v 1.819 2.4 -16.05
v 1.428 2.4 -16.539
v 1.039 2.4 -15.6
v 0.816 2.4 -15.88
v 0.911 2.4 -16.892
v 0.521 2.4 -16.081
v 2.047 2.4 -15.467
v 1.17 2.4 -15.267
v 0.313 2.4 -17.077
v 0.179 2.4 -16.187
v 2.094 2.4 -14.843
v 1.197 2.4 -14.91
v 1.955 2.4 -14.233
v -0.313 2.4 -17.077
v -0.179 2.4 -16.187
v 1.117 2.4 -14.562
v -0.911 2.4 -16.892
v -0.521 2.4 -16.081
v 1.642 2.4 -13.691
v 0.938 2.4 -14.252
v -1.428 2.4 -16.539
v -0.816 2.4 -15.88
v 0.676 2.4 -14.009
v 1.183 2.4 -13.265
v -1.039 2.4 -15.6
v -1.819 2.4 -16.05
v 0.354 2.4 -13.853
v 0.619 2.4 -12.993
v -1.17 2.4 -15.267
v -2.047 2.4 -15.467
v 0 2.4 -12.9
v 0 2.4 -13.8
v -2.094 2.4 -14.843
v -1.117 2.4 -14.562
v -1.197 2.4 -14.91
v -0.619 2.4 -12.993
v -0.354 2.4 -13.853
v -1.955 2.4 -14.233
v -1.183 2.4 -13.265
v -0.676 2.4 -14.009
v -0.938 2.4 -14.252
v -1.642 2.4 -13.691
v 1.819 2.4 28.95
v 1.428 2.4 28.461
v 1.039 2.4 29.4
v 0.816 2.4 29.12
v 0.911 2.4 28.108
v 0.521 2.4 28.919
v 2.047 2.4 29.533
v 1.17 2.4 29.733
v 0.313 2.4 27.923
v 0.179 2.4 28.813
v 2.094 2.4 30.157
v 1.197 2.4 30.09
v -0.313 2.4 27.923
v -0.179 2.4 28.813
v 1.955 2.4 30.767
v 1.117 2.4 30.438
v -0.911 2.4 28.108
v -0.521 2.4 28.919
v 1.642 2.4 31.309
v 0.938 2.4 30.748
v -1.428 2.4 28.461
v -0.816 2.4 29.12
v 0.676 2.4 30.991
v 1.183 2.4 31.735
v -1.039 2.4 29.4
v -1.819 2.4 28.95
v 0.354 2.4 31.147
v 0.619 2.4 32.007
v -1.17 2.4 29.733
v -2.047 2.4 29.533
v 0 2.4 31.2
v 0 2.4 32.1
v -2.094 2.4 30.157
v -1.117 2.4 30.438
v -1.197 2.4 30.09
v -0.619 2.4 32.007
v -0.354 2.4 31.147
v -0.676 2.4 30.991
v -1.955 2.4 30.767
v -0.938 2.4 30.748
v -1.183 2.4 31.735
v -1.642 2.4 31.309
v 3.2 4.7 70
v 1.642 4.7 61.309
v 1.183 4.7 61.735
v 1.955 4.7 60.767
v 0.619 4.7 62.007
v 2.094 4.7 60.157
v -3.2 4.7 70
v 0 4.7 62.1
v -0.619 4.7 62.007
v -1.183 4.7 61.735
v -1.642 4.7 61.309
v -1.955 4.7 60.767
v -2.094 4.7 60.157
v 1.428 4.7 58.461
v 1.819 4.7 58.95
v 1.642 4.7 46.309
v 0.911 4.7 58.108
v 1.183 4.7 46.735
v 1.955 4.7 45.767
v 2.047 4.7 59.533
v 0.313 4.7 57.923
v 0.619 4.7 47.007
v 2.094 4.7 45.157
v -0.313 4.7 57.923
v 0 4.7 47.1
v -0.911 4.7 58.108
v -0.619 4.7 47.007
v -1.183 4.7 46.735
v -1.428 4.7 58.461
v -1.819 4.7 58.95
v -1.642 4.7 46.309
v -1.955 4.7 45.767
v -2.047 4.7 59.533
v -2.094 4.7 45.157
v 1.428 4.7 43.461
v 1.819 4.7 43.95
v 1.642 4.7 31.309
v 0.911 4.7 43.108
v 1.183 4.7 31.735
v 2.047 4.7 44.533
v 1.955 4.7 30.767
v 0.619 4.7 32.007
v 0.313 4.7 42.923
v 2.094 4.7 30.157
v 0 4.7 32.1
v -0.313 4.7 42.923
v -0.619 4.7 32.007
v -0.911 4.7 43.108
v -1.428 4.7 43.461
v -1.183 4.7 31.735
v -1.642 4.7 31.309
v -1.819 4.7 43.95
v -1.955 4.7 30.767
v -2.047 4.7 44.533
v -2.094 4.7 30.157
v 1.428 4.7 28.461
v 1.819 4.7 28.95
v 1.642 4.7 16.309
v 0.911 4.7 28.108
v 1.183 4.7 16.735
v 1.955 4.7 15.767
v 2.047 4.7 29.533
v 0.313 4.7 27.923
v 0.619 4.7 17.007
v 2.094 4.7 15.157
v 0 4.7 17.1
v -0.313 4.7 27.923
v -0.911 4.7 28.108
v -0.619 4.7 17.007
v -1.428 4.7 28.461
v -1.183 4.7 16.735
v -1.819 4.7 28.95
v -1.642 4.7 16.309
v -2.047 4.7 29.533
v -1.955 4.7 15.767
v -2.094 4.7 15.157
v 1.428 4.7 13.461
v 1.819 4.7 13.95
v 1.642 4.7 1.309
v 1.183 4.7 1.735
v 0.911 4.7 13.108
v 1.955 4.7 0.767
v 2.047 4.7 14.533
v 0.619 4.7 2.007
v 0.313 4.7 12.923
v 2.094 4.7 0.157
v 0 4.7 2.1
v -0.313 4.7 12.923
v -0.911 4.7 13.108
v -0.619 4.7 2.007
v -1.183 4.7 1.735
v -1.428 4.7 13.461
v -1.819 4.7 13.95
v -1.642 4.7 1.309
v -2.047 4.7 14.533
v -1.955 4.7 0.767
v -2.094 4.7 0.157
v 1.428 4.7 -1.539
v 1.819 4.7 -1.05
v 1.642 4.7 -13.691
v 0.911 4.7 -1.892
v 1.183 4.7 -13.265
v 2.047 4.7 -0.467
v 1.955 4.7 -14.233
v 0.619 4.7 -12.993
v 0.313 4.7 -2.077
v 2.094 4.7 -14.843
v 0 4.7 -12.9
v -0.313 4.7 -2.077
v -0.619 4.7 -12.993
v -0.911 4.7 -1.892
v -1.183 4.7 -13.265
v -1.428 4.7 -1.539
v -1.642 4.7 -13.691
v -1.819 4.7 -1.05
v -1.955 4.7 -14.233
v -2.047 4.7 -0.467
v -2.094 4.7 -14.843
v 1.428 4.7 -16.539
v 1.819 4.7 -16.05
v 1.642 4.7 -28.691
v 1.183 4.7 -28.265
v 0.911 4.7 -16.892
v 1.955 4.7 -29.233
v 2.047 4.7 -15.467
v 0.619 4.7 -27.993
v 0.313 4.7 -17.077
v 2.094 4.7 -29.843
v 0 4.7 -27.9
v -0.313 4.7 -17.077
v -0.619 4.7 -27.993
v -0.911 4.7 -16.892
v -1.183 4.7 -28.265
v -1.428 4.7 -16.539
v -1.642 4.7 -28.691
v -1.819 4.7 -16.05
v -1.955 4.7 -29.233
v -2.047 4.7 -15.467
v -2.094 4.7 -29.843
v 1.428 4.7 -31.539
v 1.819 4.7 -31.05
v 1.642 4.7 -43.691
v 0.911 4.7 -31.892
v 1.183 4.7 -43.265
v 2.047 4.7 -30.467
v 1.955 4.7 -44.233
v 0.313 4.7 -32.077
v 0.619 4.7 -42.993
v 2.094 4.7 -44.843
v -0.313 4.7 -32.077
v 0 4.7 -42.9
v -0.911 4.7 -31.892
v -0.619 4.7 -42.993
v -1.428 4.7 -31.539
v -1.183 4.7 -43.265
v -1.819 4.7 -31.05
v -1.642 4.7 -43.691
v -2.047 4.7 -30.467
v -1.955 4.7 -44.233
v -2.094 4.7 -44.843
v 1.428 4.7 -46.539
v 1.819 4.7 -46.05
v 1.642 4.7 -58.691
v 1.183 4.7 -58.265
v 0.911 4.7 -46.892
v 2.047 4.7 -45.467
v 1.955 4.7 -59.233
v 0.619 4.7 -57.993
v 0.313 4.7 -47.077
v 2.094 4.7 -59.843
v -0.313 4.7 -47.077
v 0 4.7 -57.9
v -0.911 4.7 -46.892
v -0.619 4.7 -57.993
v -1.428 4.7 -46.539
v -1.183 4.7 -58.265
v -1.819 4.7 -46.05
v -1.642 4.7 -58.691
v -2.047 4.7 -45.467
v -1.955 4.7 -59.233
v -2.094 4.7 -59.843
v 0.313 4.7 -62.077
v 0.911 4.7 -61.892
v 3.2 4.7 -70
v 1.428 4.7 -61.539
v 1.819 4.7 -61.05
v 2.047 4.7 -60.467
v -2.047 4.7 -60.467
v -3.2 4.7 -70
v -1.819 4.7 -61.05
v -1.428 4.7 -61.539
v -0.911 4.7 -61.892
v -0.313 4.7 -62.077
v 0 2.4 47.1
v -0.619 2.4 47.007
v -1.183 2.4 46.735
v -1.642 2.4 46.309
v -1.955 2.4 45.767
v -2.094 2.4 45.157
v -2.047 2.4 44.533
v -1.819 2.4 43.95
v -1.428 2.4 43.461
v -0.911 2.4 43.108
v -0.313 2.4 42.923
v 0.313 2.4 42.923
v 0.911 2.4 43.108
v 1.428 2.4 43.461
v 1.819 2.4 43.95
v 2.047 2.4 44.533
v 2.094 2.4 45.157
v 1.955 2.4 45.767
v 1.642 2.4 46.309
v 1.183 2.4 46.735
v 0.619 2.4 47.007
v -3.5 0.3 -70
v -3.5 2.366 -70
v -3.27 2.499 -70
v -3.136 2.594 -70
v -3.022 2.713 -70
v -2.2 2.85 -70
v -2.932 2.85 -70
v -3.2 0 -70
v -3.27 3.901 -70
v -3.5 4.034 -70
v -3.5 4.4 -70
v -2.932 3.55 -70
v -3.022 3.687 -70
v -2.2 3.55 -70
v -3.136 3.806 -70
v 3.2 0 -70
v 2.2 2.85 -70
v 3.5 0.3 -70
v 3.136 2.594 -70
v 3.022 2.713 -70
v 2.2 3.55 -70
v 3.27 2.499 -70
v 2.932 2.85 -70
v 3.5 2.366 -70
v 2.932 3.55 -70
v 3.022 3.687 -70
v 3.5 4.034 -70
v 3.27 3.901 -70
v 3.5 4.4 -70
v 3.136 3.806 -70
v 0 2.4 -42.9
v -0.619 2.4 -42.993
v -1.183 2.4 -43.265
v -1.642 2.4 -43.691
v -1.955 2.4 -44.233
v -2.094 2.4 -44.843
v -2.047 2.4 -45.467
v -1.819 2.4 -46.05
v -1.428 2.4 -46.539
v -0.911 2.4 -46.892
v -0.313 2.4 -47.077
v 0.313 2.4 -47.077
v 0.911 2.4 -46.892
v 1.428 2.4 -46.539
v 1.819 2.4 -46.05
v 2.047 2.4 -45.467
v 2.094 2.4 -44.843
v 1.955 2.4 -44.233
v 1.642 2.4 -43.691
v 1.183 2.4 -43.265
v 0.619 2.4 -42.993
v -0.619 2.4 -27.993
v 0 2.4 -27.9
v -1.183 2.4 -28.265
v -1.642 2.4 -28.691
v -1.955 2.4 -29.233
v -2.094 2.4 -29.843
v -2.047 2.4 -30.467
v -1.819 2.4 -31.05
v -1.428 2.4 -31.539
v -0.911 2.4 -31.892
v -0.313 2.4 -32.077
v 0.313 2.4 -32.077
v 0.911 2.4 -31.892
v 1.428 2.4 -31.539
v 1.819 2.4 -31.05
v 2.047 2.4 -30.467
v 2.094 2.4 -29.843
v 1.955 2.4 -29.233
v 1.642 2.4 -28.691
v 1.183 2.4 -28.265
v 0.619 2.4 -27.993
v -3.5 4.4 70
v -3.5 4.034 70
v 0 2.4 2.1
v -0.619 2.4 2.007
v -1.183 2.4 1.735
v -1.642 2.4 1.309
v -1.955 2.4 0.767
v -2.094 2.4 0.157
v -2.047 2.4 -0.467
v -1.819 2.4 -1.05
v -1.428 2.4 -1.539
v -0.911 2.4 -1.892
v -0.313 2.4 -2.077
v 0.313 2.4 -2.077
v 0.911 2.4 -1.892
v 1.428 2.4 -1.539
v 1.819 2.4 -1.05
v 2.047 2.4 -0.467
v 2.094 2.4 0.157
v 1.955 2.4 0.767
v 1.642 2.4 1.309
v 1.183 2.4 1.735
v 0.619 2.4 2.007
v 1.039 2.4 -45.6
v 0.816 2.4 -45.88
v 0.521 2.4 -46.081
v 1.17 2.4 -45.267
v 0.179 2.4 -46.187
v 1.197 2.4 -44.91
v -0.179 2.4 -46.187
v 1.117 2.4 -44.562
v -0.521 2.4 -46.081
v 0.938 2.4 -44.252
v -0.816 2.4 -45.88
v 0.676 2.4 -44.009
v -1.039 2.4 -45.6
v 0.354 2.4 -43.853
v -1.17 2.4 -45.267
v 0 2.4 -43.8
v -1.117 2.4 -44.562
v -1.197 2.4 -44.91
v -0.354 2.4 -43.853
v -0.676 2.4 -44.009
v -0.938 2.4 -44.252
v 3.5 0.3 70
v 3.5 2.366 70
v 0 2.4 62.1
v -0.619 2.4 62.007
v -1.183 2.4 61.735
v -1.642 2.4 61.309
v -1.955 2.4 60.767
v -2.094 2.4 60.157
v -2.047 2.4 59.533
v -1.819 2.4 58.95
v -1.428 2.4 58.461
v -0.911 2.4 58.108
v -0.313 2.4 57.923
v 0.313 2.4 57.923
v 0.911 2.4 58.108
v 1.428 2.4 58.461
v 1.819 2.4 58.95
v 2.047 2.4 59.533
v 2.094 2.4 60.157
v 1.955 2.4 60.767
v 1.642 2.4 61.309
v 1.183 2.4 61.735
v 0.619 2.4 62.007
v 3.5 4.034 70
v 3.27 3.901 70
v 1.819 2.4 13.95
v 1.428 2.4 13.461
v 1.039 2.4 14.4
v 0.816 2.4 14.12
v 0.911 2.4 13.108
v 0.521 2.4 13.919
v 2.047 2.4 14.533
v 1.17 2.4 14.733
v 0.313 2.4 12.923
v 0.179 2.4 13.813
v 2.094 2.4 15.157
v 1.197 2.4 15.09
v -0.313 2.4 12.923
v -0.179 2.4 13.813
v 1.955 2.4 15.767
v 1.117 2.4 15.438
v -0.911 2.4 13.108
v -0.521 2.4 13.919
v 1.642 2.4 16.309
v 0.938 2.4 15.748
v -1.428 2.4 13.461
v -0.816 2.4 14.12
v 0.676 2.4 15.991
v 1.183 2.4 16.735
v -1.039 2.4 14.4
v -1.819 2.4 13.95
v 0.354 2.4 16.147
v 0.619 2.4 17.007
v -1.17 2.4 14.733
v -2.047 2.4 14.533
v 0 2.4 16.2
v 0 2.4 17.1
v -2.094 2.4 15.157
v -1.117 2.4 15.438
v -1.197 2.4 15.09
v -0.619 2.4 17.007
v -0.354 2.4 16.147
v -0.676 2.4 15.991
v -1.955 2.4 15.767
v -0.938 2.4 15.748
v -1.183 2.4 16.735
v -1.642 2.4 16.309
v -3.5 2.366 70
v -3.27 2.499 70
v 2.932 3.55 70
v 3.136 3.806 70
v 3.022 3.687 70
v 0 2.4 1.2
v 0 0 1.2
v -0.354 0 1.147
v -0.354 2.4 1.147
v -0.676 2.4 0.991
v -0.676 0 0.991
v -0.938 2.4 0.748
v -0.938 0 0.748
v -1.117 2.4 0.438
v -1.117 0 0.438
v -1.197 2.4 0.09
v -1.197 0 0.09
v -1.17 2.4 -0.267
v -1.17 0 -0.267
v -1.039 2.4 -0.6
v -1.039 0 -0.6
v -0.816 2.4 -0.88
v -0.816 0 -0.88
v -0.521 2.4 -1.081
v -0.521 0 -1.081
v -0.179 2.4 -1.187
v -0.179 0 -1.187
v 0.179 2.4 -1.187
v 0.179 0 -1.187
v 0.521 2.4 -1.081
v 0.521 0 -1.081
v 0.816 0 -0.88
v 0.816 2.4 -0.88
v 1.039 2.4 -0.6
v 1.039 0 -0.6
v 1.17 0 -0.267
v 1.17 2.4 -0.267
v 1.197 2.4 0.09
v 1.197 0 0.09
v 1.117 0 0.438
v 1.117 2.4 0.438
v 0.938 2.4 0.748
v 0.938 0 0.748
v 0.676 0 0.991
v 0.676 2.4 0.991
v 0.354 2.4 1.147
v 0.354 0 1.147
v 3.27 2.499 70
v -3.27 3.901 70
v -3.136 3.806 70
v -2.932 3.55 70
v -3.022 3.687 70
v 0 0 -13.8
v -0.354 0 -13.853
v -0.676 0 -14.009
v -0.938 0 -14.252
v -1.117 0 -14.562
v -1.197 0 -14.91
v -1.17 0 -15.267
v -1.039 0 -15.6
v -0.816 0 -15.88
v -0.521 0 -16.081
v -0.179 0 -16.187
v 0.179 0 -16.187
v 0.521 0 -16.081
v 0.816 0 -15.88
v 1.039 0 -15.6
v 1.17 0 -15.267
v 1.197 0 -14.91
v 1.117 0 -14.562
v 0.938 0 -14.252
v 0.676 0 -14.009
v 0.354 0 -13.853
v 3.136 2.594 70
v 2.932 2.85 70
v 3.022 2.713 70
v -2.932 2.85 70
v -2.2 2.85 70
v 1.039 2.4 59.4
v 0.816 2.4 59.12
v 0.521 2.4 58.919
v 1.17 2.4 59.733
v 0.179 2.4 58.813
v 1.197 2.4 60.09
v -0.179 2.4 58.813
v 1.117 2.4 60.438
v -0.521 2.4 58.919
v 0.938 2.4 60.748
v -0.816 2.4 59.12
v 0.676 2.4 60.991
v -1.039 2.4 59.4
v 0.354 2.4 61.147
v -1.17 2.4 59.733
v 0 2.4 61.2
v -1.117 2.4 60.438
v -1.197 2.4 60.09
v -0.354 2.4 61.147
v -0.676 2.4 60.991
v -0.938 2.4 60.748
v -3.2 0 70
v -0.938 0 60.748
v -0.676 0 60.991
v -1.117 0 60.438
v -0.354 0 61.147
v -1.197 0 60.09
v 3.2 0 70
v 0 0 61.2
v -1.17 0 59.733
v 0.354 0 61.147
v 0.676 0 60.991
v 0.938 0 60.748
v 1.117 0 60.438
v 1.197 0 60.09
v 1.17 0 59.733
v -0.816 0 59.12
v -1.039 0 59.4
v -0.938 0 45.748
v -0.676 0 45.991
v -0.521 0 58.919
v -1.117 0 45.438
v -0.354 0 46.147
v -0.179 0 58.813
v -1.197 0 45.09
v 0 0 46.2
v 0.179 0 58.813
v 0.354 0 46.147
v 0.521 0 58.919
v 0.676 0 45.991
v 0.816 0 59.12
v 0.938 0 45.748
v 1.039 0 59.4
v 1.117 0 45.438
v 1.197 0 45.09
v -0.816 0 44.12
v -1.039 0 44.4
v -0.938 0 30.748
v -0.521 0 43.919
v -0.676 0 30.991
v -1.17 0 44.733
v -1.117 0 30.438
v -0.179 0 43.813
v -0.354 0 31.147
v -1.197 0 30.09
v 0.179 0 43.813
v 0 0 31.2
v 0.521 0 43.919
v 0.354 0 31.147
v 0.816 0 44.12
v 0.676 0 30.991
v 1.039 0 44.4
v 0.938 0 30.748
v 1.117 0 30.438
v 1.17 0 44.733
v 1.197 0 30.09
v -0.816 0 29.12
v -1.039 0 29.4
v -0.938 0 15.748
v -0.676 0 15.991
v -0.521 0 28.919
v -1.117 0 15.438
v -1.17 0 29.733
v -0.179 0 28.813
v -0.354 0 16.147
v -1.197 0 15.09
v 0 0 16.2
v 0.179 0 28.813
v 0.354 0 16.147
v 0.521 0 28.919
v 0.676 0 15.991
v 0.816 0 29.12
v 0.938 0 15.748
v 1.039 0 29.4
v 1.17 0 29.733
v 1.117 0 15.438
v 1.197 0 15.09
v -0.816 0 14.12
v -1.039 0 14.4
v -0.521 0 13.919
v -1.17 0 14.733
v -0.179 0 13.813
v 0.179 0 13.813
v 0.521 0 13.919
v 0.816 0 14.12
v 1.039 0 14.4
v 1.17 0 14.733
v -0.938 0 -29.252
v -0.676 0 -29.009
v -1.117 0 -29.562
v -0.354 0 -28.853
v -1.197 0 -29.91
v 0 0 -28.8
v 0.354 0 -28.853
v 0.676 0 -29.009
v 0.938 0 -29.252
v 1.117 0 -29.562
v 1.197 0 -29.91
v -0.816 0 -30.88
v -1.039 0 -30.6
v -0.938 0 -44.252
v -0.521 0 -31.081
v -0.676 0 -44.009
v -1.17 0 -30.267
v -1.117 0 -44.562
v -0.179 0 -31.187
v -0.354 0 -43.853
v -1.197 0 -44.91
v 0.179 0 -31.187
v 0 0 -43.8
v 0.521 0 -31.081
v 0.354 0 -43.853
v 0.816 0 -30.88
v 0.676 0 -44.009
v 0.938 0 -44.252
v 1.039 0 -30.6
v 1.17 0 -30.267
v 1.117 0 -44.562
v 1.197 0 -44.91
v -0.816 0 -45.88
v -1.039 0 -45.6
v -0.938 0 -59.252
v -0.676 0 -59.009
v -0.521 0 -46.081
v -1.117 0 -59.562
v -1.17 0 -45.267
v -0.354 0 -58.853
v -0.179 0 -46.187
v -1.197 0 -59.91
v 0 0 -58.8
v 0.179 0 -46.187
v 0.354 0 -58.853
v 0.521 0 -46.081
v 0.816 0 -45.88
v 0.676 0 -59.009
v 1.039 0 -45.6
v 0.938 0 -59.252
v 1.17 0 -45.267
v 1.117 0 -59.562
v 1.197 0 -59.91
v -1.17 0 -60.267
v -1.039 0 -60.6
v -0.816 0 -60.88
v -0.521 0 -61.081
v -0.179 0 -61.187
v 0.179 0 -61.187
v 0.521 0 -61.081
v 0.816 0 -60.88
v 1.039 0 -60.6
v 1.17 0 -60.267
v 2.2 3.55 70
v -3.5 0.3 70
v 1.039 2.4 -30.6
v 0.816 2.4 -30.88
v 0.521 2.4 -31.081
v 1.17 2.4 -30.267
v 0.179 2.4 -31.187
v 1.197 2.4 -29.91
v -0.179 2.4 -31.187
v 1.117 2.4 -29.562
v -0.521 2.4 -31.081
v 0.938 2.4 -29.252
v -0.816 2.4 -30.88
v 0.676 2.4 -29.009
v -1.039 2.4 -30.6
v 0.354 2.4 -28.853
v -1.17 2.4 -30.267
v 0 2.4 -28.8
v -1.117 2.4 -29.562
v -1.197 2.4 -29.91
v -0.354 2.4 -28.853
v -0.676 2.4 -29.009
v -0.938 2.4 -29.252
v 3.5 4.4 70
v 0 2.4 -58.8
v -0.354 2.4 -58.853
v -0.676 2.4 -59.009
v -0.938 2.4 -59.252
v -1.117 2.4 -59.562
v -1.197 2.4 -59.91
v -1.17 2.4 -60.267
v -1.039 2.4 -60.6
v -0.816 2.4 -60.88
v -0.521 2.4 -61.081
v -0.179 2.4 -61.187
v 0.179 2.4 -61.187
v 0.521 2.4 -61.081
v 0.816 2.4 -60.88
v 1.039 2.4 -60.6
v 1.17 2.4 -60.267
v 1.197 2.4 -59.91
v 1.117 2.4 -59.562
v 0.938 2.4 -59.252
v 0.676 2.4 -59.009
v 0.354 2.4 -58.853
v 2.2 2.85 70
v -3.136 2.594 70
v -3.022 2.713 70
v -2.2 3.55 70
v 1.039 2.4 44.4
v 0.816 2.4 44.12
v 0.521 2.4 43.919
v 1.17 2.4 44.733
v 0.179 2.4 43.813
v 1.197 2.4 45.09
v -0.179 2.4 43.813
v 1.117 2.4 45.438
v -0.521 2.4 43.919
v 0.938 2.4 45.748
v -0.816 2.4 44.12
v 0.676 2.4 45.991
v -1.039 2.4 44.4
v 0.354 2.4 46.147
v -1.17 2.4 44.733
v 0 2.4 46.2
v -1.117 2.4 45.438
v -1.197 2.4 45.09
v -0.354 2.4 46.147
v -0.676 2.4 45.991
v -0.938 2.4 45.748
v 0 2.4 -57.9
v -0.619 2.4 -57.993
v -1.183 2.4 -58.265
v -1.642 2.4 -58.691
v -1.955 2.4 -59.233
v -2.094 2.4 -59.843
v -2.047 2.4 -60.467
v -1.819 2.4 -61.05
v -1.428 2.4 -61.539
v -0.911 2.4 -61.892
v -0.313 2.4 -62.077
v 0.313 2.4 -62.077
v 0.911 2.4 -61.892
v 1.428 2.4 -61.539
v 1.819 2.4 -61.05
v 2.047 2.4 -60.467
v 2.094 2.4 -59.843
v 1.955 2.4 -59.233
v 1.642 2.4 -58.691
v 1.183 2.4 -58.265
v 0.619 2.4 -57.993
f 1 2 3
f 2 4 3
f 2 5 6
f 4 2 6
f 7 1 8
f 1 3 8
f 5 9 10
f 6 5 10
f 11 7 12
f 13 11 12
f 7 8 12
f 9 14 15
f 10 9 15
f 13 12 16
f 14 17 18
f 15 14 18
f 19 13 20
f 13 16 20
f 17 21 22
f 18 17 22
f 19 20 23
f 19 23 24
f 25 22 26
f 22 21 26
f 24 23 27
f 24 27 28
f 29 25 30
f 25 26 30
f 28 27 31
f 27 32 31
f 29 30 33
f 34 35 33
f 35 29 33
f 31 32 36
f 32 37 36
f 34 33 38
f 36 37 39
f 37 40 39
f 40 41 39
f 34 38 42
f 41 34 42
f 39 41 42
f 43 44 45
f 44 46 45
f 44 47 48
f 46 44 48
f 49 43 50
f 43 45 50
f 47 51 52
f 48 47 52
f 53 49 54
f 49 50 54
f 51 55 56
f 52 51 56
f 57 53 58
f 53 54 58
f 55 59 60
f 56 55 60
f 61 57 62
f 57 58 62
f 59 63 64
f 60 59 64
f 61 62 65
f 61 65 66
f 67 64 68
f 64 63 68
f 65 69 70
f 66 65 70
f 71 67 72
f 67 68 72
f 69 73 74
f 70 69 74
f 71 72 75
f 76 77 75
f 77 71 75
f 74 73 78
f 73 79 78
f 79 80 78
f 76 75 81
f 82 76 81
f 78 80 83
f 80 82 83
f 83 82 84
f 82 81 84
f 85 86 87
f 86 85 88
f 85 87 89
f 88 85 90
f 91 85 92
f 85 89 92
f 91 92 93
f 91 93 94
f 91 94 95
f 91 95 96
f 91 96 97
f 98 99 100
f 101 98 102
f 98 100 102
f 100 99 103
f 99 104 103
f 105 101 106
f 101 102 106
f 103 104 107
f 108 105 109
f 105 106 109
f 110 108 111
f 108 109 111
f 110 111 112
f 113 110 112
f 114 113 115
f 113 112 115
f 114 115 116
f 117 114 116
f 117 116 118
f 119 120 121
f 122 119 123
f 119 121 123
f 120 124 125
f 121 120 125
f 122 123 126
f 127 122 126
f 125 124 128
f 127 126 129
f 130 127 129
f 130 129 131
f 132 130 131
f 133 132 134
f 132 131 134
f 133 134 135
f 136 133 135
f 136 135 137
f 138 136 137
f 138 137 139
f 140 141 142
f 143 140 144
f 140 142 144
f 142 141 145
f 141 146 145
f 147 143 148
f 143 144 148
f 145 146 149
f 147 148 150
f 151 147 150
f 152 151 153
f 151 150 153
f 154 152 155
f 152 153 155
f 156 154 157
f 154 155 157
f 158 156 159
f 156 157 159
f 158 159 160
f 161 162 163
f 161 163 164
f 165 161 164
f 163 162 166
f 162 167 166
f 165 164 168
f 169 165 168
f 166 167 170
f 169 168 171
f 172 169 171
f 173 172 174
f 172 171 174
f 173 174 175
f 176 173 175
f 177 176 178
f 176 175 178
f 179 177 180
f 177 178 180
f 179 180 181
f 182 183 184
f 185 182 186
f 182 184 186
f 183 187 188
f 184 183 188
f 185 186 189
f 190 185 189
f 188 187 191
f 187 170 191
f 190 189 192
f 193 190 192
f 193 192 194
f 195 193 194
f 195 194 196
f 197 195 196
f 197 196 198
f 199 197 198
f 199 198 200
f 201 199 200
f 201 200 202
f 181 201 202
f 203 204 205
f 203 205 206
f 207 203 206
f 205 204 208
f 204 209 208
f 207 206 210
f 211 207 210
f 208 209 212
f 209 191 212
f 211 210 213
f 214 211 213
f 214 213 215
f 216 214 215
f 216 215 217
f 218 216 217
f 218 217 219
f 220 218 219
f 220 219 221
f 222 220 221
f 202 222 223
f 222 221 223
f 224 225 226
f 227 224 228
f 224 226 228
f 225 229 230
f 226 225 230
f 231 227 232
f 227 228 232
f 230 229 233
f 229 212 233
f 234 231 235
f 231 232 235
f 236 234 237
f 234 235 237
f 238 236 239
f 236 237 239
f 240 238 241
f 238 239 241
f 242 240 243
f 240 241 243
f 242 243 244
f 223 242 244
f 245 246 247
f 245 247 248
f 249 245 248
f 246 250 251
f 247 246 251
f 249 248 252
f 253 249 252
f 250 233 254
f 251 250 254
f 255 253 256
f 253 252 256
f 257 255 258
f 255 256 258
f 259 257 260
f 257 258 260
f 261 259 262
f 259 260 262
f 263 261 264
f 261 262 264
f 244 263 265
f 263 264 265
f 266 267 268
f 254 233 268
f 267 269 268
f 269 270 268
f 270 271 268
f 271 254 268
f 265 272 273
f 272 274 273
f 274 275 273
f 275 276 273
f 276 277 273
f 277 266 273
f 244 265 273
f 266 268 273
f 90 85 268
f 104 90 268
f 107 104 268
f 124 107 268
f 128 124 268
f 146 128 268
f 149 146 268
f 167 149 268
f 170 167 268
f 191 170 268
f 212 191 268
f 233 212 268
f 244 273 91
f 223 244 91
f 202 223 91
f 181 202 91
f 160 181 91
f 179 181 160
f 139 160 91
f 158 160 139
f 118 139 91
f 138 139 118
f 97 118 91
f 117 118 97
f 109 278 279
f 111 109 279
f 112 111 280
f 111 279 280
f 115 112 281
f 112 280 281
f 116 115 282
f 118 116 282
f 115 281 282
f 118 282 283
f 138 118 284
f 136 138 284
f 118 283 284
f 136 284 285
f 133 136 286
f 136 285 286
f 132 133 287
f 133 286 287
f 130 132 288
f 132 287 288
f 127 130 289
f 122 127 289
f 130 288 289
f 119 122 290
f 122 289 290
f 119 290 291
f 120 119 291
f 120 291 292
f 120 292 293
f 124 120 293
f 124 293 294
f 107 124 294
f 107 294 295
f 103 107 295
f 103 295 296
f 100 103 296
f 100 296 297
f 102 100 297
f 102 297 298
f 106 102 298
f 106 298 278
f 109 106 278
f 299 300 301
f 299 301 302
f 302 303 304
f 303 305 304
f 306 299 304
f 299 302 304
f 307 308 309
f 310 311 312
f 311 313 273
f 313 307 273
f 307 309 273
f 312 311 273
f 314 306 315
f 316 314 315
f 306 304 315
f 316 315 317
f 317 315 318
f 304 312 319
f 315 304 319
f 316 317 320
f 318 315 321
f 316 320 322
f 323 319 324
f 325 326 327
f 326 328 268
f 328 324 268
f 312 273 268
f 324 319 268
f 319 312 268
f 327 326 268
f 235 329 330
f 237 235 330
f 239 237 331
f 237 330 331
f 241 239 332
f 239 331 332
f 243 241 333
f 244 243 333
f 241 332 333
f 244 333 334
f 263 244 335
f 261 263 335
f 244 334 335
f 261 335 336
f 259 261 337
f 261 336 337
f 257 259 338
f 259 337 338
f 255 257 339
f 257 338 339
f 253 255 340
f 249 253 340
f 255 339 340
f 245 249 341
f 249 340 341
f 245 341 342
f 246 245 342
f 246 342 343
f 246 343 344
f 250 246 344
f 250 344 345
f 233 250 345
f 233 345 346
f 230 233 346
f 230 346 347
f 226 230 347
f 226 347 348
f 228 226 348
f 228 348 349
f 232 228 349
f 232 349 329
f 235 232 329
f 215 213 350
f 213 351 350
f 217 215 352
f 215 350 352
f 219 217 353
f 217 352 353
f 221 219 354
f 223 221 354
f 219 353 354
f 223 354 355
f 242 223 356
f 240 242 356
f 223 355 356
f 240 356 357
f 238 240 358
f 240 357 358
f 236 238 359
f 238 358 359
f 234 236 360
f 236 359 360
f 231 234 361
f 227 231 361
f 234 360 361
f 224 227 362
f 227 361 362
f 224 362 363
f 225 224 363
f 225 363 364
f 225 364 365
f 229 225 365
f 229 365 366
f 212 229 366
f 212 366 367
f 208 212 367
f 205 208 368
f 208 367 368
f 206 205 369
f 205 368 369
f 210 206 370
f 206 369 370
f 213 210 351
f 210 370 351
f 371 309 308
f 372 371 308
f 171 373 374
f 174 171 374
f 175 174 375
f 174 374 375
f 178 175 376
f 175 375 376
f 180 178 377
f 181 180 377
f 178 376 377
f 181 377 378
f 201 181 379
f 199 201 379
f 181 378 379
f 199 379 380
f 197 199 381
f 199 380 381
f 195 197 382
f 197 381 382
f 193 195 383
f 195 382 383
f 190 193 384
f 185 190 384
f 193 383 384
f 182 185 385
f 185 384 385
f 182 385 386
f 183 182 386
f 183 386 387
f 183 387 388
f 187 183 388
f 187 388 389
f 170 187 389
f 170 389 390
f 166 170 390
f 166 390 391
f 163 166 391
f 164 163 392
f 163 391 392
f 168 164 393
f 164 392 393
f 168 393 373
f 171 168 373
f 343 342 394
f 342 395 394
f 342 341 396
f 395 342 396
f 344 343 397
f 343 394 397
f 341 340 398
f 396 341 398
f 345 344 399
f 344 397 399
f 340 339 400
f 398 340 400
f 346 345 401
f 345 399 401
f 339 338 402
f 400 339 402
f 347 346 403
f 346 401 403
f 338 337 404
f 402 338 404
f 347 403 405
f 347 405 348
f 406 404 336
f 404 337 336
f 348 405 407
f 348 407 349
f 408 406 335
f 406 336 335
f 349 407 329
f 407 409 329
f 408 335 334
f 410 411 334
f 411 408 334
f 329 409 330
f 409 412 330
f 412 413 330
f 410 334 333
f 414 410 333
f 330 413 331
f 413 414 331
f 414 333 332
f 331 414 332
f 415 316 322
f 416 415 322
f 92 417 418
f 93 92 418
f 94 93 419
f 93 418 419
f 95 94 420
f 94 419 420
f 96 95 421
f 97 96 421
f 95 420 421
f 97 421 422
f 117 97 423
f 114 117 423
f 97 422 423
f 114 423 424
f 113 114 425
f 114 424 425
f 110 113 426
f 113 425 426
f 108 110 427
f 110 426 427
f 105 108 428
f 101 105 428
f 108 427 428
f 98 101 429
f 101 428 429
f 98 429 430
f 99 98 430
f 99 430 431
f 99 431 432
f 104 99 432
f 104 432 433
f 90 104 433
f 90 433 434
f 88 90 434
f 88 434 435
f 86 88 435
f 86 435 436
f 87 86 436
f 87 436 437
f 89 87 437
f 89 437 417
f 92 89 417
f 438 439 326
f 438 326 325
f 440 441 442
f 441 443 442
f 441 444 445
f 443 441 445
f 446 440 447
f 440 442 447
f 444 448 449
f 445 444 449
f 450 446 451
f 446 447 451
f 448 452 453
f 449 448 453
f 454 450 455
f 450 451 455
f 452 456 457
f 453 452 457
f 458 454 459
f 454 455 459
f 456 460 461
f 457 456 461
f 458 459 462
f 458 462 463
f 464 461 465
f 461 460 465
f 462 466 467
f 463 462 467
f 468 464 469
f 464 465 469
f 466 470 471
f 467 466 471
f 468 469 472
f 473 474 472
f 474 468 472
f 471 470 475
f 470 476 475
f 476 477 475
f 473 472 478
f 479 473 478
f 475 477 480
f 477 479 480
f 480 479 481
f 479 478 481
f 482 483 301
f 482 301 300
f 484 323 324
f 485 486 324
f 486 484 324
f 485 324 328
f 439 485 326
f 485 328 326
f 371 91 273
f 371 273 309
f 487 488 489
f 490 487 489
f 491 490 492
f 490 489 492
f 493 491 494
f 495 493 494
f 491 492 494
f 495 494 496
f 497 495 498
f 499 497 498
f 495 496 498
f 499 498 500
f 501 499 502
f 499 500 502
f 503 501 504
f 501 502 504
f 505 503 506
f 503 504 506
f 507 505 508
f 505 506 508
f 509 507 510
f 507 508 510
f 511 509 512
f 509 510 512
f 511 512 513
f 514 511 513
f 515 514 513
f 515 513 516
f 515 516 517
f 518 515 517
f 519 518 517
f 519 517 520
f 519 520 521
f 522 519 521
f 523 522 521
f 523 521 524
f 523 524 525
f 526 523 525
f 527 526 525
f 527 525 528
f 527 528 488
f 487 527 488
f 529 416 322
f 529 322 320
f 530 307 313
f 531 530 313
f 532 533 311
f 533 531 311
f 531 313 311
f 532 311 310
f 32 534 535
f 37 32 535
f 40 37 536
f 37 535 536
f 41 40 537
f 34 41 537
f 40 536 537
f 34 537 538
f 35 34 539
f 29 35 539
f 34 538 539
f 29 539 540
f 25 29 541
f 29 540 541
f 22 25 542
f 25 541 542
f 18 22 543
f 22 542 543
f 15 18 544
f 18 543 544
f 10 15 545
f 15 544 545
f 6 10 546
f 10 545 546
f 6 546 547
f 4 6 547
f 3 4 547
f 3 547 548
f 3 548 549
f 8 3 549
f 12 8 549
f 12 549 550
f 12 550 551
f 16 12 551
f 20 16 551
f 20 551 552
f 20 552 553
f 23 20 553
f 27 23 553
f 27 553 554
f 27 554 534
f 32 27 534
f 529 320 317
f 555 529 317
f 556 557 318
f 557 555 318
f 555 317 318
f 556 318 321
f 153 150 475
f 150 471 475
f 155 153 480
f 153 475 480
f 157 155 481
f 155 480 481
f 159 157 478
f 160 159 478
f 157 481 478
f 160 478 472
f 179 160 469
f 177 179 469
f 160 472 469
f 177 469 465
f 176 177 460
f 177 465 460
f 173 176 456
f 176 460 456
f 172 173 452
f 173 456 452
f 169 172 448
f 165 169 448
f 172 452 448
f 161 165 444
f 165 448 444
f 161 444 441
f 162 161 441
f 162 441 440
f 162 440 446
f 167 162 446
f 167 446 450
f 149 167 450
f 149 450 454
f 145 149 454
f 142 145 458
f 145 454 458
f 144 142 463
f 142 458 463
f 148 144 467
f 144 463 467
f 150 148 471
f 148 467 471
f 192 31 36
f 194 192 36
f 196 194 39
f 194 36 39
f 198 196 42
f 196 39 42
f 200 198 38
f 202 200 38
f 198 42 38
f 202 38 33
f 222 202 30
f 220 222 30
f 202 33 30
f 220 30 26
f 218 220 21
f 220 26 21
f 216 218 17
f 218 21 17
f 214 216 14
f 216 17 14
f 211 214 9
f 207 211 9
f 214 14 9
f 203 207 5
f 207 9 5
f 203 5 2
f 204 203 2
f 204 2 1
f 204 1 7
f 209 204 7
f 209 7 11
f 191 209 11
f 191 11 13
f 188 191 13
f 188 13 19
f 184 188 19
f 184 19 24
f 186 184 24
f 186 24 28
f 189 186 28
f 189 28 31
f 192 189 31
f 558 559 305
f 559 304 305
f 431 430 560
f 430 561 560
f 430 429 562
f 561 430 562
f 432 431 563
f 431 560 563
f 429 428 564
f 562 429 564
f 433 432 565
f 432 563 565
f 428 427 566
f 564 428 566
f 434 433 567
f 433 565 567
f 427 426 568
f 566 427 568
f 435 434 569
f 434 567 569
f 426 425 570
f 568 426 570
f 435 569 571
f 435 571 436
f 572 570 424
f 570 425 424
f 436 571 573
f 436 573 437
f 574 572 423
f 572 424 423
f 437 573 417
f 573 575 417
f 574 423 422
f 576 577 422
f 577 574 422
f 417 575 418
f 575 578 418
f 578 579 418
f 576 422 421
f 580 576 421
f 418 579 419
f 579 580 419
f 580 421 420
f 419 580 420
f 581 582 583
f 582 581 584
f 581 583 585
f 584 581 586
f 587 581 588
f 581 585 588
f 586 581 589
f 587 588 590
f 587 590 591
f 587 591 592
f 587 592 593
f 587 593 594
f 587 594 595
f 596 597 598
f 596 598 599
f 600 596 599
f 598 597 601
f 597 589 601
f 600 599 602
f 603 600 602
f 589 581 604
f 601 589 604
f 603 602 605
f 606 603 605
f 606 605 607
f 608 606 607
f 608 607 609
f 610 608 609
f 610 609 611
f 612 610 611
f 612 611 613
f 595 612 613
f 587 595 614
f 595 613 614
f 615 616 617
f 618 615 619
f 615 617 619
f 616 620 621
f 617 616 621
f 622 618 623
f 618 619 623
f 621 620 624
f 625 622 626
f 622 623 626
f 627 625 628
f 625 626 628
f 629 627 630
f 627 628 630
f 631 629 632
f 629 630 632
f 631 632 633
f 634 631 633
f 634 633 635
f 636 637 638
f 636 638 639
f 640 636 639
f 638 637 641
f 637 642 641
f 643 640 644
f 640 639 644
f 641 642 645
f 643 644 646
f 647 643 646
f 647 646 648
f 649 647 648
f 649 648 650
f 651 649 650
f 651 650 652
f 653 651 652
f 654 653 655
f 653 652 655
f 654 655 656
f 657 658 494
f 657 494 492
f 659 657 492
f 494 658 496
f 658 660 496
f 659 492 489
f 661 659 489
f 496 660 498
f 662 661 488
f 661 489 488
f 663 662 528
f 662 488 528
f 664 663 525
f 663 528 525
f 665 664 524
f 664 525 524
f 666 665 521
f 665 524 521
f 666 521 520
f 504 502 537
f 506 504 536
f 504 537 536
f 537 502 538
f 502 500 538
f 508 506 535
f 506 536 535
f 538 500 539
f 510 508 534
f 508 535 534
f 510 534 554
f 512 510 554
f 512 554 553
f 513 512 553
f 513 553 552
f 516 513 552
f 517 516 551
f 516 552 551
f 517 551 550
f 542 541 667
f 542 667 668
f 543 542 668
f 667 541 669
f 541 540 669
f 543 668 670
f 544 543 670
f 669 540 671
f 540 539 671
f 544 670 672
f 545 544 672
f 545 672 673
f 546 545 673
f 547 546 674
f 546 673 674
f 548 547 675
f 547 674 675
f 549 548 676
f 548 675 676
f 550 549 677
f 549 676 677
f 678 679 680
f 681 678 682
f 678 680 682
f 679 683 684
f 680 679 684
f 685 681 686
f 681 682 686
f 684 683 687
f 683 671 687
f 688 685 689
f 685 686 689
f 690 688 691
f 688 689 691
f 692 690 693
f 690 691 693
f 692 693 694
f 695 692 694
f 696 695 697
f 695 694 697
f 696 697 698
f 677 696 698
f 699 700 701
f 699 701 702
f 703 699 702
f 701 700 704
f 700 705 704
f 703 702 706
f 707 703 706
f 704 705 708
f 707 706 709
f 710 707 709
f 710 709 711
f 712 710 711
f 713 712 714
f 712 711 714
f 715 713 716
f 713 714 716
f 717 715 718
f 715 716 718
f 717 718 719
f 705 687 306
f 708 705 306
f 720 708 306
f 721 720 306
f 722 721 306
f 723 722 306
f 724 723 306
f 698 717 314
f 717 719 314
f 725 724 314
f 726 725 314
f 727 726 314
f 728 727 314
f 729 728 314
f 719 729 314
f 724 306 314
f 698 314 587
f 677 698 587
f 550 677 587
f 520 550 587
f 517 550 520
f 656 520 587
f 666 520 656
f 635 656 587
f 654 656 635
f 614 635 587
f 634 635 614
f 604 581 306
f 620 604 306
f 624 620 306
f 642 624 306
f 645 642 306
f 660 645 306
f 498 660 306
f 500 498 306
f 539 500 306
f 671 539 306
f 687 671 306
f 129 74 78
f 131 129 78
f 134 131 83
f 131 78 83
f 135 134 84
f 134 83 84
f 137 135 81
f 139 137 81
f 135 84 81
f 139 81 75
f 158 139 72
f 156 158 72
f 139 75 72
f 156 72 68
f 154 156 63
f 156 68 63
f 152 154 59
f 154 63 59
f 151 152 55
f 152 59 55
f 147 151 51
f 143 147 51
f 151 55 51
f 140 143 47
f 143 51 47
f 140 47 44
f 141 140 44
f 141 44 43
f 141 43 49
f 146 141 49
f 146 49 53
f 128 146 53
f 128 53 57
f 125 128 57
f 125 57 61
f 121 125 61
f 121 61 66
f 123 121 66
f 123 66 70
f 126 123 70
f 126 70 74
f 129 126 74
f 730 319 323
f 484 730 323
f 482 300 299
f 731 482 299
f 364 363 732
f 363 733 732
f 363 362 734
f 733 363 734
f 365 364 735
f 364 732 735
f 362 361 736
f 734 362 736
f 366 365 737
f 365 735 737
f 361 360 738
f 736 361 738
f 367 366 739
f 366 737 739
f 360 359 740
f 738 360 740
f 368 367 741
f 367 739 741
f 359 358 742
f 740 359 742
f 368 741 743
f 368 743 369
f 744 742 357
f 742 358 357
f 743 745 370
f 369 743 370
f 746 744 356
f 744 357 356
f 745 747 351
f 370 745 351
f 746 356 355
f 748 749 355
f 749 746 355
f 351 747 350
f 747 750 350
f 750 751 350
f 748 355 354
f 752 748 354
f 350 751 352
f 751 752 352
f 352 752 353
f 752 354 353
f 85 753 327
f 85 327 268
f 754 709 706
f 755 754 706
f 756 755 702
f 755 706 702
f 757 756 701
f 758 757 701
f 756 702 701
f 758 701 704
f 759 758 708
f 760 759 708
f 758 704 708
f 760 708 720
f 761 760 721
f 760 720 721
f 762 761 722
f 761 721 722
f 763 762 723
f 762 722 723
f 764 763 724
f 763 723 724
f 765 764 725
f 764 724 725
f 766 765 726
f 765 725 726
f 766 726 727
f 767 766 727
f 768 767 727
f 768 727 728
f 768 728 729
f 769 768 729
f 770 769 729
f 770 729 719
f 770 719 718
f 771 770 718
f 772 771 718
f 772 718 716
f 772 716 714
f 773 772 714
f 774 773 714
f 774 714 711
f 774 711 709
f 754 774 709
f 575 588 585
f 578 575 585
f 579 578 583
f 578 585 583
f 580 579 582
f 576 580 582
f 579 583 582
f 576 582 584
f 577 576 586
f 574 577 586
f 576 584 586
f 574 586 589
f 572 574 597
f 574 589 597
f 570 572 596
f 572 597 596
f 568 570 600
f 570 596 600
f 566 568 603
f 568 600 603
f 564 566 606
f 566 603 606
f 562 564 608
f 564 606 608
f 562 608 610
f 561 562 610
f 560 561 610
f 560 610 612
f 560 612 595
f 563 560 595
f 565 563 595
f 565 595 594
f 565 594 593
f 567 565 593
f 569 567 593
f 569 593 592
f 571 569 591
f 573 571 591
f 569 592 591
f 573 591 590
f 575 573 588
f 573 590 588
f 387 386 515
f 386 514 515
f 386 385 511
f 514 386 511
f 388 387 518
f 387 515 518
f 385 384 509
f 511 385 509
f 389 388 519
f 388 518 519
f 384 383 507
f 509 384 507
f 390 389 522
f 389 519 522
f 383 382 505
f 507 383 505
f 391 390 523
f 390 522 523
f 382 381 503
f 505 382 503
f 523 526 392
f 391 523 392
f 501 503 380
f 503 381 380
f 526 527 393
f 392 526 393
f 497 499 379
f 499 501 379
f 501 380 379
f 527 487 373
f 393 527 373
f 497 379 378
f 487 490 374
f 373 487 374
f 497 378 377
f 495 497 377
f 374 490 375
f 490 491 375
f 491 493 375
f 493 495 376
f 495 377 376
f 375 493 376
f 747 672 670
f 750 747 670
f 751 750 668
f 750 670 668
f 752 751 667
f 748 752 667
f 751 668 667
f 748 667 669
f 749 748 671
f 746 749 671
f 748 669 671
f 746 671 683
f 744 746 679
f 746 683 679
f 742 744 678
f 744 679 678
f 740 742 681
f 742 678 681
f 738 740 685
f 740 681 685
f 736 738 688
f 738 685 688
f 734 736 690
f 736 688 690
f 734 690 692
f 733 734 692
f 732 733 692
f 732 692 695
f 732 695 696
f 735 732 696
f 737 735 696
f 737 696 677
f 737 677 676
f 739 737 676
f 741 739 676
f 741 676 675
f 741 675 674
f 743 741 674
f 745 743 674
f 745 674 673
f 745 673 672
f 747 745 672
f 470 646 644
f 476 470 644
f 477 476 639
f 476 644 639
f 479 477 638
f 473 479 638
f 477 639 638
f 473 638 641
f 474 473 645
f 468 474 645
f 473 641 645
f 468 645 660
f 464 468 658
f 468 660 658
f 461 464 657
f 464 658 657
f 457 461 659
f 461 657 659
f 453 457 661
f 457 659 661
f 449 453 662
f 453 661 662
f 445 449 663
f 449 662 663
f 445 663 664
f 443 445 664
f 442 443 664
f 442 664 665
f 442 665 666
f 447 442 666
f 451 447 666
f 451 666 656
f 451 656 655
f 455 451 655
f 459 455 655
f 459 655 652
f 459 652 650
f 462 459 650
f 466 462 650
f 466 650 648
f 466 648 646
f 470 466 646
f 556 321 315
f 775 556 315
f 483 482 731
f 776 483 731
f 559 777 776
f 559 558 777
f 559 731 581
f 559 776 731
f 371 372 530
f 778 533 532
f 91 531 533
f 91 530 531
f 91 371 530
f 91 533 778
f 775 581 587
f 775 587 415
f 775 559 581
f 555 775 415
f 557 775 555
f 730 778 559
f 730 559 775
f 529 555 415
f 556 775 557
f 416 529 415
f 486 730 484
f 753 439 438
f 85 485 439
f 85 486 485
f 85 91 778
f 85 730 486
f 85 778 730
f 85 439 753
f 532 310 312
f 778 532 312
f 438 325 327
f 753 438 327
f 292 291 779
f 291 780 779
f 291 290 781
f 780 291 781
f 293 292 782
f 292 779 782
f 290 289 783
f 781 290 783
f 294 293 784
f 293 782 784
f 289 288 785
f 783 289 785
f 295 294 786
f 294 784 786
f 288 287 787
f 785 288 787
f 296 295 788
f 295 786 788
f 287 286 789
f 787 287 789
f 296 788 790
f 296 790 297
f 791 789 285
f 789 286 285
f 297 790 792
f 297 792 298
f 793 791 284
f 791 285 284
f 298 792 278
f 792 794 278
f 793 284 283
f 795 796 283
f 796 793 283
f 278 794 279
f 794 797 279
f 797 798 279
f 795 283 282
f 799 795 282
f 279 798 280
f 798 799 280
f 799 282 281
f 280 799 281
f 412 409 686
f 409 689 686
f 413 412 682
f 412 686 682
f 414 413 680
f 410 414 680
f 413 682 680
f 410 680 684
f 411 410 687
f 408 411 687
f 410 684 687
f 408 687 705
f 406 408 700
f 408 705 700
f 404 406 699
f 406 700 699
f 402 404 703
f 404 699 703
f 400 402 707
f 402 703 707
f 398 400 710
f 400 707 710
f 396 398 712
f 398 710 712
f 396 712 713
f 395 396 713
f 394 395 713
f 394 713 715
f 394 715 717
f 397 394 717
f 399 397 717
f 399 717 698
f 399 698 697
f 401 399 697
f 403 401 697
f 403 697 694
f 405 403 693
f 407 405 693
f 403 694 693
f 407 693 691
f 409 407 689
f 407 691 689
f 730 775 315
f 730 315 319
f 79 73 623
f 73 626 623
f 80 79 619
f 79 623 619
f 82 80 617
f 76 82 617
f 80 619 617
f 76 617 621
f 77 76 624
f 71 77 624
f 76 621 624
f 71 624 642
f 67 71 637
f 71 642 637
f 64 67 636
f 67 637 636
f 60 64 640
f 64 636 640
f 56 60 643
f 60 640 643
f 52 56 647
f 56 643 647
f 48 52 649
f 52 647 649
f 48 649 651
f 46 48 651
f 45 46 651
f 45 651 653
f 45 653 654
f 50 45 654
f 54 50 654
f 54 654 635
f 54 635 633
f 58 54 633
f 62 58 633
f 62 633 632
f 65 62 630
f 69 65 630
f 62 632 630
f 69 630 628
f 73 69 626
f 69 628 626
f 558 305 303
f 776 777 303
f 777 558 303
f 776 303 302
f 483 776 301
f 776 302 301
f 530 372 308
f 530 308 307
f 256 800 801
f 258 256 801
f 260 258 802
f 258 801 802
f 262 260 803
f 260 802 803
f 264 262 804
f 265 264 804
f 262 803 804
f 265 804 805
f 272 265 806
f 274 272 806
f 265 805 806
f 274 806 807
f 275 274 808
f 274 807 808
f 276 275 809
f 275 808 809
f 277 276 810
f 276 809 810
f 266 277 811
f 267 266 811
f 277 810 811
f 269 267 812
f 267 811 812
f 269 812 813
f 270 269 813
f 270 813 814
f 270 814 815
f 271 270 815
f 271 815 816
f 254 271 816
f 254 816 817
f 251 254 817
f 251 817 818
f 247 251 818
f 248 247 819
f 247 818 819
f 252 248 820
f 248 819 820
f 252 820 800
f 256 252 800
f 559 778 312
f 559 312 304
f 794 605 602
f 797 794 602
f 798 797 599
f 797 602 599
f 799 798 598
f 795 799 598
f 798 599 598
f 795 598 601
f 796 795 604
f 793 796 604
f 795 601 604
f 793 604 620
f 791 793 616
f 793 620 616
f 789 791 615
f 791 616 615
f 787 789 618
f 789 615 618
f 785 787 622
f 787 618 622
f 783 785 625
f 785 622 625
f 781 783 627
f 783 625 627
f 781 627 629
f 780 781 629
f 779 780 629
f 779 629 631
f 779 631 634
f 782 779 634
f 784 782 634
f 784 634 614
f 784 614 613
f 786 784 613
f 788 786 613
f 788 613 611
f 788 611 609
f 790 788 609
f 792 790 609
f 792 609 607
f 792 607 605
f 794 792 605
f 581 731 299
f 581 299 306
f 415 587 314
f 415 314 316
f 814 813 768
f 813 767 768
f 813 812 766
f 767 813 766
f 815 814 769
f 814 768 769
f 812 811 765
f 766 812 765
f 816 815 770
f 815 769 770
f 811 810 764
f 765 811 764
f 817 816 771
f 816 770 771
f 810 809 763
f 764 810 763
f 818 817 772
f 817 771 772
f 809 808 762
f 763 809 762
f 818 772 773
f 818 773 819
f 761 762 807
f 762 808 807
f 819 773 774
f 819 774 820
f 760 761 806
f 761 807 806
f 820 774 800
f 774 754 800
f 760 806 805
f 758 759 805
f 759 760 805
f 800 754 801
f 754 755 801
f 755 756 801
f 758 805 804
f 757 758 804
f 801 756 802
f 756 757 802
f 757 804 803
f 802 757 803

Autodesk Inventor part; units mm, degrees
sketch "Sketch_12" plane through (0, 0, 0) normal (0, 0, 1) x (1, 0, 0)
  line L0 (-3.5, 4.4) -> (-3.5, 4.0339)
  line L1 (-3.5, 4.0339) -> (-3.2695, 3.9008)
  arc A0 (-2.9324, 3.55) -> (-3.2695, 3.9008) centre (-3.707, 3.143) ccw
  line L2 (-2.9324, 3.55) -> (-2.2, 3.55)
  line L3 (-2.2, 3.55) -> (-2.2, 2.85)
  line L4 (-2.2, 2.85) -> (-2.9324, 2.85)
  arc A1 (-3.2695, 2.4992) -> (-2.9324, 2.85) centre (-3.707, 3.257) ccw
  line L5 (-3.2695, 2.4992) -> (-3.5, 2.3662)
  line L6 (-3.5, 2.3662) -> (-3.5, 0.3)
  line L7 (-3.5, 0.3) -> (-3.2, 0)
  line L8 (-3.2, 0) -> (3.2, 0)
  line L9 (3.2, 0) -> (3.5, 0.3)
  line L10 (3.5, 0.3) -> (3.5, 2.3662)
  line L11 (3.5, 2.3662) -> (3.2695, 2.4992)
  arc A2 (2.9324, 2.85) -> (3.2695, 2.4992) centre (3.707, 3.257) ccw
  line L12 (2.9324, 2.85) -> (2.2, 2.85)
  line L13 (2.2, 2.85) -> (2.2, 3.55)
  line L14 (2.2, 3.55) -> (2.9324, 3.55)
  arc A3 (3.2695, 3.9008) -> (2.9324, 3.55) centre (3.707, 3.143) ccw
  line L15 (3.2695, 3.9008) -> (3.5, 4.0339)
  line L16 (3.5, 4.0339) -> (3.5, 4.4)
  line L17 (3.5, 4.4) -> (3.2, 4.7)
  line L18 (3.2, 4.7) -> (-3.2, 4.7)
  line L19 (-3.2, 4.7) -> (-3.5, 4.4)
extrude "Extrusion1" add sketch "Sketch_12" along normal mid plane 140
sketch "Sketch2" plane through (-3.2, 4.7, 70) normal (0, 1, 0) x (1, 0, 0)
  point P0 (3.2, 130)
hole "Hole1" at (0, 4.7, -60) direction (0, -1, 0) diameter 2.4 depth 4.7 counterbore diameter 4.2 counterbore depth 2.3
pattern_linear "Rectangular Pattern1" count 9 spacing 15 along (0, 0, 1) of "Hole1"
ref_plane "to_block_XY" through (0, 4.7, 35) normal (0, 0, -1) x (1, 0, 0)
ref_plane "to_block_YZ" through (0, 4.7, 35) normal (1, 0, 0) x (0, -1, 0)
ref_plane "to_block_ZX" through (0, 4.7, 35) normal (0, -1, 0) x (0, 0, -1)
ref_plane "to_block_2_XY" through (0, 4.7, -35) normal (0, 0, -1) x (1, 0, 0)
ref_plane "to_block_2_YZ" through (0, 4.7, -35) normal (1, 0, 0) x (0, -1, 0)
ref_plane "to_block_2_ZX" through (0, 4.7, -35) normal (0, -1, 0) x (0, 0, -1)
ref_plane "to_bolt_1_XY" through (0, 2.4, 60) normal (0, 1, 0) x (1, 0, 0)
ref_plane "to_bolt_1_YZ" through (0, 2.4, 60) normal (1, 0, 0) x (0, 0, -1)
ref_plane "to_bolt_1_ZX" through (0, 2.4, 60) normal (0, 0, -1) x (0, 1, 0)
ref_plane "to_bolt_2_XY" through (0, 2.4, 45) normal (0, 1, 0) x (1, 0, 0)
ref_plane "to_bolt_2_YZ" through (0, 2.4, 45) normal (1, 0, 0) x (0, 0, -1)
ref_plane "to_bolt_2_ZX" through (0, 2.4, 45) normal (0, 0, -1) x (0, 1, 0)
ref_plane "to_bolt_3_XY" through (0, 2.4, 30) normal (0, 1, 0) x (1, 0, 0)
ref_plane "to_bolt_3_YZ" through (0, 2.4, 30) normal (1, 0, 0) x (0, 0, -1)
ref_plane "to_bolt_3_ZX" through (0, 2.4, 30) normal (0, 0, -1) x (0, 1, 0)
ref_plane "to_bolt_4_XY" through (0, 2.4, 15) normal (0, 1, 0) x (1, 0, 0)
ref_plane "to_bolt_4_YZ" through (0, 2.4, 15) normal (1, 0, 0) x (0, 0, -1)
ref_plane "to_bolt_4_ZX" through (0, 2.4, 15) normal (0, 0, -1) x (0, 1, 0)
ref_plane "to_bolt_5_XY" through (0, 2.4, 0) normal (0, 1, 0) x (1, 0, 0)
ref_plane "to_bolt_5_YZ" through (0, 2.4, 0) normal (1, 0, 0) x (0, 0, -1)
ref_plane "to_bolt_5_ZX" through (0, 2.4, 0) normal (0, 0, -1) x (0, 1, 0)
ref_plane "to_bolt_6_XY" through (0, 2.4, -15) normal (0, 1, 0) x (1, 0, 0)
ref_plane "to_bolt_6_YZ" through (0, 2.4, -15) normal (1, 0, 0) x (0, 0, -1)
ref_plane "to_bolt_6_ZX" through (0, 2.4, -15) normal (0, 0, -1) x (0, 1, 0)
ref_plane "to_bolt_7_XY" through (0, 2.4, -30) normal (0, 1, 0) x (1, 0, 0)
ref_plane "to_bolt_7_YZ" through (0, 2.4, -30) normal (1, 0, 0) x (0, 0, -1)
ref_plane "to_bolt_7_ZX" through (0, 2.4, -30) normal (0, 0, -1) x (0, 1, 0)
ref_plane "to_bolt_8_XY" through (0, 2.4, -45) normal (0, 1, 0) x (1, 0, 0)
ref_plane "to_bolt_8_YZ" through (0, 2.4, -45) normal (1, 0, 0) x (0, 0, -1)
ref_plane "to_bolt_8_ZX" through (0, 2.4, -45) normal (0, 0, -1) x (0, 1, 0)
ref_plane "to_bolt_9_XY" through (0, 2.4, -60) normal (0, 1, 0) x (1, 0, 0)
ref_plane "to_bolt_9_YZ" through (0, 2.4, -60) normal (1, 0, 0) x (0, 0, -1)
ref_plane "to_bolt_9_ZX" through (0, 2.4, -60) normal (0, 0, -1) x (0, 1, 0)
properties part number "SSE2BLZ8-140_r1" material "ステンレス鋼"
